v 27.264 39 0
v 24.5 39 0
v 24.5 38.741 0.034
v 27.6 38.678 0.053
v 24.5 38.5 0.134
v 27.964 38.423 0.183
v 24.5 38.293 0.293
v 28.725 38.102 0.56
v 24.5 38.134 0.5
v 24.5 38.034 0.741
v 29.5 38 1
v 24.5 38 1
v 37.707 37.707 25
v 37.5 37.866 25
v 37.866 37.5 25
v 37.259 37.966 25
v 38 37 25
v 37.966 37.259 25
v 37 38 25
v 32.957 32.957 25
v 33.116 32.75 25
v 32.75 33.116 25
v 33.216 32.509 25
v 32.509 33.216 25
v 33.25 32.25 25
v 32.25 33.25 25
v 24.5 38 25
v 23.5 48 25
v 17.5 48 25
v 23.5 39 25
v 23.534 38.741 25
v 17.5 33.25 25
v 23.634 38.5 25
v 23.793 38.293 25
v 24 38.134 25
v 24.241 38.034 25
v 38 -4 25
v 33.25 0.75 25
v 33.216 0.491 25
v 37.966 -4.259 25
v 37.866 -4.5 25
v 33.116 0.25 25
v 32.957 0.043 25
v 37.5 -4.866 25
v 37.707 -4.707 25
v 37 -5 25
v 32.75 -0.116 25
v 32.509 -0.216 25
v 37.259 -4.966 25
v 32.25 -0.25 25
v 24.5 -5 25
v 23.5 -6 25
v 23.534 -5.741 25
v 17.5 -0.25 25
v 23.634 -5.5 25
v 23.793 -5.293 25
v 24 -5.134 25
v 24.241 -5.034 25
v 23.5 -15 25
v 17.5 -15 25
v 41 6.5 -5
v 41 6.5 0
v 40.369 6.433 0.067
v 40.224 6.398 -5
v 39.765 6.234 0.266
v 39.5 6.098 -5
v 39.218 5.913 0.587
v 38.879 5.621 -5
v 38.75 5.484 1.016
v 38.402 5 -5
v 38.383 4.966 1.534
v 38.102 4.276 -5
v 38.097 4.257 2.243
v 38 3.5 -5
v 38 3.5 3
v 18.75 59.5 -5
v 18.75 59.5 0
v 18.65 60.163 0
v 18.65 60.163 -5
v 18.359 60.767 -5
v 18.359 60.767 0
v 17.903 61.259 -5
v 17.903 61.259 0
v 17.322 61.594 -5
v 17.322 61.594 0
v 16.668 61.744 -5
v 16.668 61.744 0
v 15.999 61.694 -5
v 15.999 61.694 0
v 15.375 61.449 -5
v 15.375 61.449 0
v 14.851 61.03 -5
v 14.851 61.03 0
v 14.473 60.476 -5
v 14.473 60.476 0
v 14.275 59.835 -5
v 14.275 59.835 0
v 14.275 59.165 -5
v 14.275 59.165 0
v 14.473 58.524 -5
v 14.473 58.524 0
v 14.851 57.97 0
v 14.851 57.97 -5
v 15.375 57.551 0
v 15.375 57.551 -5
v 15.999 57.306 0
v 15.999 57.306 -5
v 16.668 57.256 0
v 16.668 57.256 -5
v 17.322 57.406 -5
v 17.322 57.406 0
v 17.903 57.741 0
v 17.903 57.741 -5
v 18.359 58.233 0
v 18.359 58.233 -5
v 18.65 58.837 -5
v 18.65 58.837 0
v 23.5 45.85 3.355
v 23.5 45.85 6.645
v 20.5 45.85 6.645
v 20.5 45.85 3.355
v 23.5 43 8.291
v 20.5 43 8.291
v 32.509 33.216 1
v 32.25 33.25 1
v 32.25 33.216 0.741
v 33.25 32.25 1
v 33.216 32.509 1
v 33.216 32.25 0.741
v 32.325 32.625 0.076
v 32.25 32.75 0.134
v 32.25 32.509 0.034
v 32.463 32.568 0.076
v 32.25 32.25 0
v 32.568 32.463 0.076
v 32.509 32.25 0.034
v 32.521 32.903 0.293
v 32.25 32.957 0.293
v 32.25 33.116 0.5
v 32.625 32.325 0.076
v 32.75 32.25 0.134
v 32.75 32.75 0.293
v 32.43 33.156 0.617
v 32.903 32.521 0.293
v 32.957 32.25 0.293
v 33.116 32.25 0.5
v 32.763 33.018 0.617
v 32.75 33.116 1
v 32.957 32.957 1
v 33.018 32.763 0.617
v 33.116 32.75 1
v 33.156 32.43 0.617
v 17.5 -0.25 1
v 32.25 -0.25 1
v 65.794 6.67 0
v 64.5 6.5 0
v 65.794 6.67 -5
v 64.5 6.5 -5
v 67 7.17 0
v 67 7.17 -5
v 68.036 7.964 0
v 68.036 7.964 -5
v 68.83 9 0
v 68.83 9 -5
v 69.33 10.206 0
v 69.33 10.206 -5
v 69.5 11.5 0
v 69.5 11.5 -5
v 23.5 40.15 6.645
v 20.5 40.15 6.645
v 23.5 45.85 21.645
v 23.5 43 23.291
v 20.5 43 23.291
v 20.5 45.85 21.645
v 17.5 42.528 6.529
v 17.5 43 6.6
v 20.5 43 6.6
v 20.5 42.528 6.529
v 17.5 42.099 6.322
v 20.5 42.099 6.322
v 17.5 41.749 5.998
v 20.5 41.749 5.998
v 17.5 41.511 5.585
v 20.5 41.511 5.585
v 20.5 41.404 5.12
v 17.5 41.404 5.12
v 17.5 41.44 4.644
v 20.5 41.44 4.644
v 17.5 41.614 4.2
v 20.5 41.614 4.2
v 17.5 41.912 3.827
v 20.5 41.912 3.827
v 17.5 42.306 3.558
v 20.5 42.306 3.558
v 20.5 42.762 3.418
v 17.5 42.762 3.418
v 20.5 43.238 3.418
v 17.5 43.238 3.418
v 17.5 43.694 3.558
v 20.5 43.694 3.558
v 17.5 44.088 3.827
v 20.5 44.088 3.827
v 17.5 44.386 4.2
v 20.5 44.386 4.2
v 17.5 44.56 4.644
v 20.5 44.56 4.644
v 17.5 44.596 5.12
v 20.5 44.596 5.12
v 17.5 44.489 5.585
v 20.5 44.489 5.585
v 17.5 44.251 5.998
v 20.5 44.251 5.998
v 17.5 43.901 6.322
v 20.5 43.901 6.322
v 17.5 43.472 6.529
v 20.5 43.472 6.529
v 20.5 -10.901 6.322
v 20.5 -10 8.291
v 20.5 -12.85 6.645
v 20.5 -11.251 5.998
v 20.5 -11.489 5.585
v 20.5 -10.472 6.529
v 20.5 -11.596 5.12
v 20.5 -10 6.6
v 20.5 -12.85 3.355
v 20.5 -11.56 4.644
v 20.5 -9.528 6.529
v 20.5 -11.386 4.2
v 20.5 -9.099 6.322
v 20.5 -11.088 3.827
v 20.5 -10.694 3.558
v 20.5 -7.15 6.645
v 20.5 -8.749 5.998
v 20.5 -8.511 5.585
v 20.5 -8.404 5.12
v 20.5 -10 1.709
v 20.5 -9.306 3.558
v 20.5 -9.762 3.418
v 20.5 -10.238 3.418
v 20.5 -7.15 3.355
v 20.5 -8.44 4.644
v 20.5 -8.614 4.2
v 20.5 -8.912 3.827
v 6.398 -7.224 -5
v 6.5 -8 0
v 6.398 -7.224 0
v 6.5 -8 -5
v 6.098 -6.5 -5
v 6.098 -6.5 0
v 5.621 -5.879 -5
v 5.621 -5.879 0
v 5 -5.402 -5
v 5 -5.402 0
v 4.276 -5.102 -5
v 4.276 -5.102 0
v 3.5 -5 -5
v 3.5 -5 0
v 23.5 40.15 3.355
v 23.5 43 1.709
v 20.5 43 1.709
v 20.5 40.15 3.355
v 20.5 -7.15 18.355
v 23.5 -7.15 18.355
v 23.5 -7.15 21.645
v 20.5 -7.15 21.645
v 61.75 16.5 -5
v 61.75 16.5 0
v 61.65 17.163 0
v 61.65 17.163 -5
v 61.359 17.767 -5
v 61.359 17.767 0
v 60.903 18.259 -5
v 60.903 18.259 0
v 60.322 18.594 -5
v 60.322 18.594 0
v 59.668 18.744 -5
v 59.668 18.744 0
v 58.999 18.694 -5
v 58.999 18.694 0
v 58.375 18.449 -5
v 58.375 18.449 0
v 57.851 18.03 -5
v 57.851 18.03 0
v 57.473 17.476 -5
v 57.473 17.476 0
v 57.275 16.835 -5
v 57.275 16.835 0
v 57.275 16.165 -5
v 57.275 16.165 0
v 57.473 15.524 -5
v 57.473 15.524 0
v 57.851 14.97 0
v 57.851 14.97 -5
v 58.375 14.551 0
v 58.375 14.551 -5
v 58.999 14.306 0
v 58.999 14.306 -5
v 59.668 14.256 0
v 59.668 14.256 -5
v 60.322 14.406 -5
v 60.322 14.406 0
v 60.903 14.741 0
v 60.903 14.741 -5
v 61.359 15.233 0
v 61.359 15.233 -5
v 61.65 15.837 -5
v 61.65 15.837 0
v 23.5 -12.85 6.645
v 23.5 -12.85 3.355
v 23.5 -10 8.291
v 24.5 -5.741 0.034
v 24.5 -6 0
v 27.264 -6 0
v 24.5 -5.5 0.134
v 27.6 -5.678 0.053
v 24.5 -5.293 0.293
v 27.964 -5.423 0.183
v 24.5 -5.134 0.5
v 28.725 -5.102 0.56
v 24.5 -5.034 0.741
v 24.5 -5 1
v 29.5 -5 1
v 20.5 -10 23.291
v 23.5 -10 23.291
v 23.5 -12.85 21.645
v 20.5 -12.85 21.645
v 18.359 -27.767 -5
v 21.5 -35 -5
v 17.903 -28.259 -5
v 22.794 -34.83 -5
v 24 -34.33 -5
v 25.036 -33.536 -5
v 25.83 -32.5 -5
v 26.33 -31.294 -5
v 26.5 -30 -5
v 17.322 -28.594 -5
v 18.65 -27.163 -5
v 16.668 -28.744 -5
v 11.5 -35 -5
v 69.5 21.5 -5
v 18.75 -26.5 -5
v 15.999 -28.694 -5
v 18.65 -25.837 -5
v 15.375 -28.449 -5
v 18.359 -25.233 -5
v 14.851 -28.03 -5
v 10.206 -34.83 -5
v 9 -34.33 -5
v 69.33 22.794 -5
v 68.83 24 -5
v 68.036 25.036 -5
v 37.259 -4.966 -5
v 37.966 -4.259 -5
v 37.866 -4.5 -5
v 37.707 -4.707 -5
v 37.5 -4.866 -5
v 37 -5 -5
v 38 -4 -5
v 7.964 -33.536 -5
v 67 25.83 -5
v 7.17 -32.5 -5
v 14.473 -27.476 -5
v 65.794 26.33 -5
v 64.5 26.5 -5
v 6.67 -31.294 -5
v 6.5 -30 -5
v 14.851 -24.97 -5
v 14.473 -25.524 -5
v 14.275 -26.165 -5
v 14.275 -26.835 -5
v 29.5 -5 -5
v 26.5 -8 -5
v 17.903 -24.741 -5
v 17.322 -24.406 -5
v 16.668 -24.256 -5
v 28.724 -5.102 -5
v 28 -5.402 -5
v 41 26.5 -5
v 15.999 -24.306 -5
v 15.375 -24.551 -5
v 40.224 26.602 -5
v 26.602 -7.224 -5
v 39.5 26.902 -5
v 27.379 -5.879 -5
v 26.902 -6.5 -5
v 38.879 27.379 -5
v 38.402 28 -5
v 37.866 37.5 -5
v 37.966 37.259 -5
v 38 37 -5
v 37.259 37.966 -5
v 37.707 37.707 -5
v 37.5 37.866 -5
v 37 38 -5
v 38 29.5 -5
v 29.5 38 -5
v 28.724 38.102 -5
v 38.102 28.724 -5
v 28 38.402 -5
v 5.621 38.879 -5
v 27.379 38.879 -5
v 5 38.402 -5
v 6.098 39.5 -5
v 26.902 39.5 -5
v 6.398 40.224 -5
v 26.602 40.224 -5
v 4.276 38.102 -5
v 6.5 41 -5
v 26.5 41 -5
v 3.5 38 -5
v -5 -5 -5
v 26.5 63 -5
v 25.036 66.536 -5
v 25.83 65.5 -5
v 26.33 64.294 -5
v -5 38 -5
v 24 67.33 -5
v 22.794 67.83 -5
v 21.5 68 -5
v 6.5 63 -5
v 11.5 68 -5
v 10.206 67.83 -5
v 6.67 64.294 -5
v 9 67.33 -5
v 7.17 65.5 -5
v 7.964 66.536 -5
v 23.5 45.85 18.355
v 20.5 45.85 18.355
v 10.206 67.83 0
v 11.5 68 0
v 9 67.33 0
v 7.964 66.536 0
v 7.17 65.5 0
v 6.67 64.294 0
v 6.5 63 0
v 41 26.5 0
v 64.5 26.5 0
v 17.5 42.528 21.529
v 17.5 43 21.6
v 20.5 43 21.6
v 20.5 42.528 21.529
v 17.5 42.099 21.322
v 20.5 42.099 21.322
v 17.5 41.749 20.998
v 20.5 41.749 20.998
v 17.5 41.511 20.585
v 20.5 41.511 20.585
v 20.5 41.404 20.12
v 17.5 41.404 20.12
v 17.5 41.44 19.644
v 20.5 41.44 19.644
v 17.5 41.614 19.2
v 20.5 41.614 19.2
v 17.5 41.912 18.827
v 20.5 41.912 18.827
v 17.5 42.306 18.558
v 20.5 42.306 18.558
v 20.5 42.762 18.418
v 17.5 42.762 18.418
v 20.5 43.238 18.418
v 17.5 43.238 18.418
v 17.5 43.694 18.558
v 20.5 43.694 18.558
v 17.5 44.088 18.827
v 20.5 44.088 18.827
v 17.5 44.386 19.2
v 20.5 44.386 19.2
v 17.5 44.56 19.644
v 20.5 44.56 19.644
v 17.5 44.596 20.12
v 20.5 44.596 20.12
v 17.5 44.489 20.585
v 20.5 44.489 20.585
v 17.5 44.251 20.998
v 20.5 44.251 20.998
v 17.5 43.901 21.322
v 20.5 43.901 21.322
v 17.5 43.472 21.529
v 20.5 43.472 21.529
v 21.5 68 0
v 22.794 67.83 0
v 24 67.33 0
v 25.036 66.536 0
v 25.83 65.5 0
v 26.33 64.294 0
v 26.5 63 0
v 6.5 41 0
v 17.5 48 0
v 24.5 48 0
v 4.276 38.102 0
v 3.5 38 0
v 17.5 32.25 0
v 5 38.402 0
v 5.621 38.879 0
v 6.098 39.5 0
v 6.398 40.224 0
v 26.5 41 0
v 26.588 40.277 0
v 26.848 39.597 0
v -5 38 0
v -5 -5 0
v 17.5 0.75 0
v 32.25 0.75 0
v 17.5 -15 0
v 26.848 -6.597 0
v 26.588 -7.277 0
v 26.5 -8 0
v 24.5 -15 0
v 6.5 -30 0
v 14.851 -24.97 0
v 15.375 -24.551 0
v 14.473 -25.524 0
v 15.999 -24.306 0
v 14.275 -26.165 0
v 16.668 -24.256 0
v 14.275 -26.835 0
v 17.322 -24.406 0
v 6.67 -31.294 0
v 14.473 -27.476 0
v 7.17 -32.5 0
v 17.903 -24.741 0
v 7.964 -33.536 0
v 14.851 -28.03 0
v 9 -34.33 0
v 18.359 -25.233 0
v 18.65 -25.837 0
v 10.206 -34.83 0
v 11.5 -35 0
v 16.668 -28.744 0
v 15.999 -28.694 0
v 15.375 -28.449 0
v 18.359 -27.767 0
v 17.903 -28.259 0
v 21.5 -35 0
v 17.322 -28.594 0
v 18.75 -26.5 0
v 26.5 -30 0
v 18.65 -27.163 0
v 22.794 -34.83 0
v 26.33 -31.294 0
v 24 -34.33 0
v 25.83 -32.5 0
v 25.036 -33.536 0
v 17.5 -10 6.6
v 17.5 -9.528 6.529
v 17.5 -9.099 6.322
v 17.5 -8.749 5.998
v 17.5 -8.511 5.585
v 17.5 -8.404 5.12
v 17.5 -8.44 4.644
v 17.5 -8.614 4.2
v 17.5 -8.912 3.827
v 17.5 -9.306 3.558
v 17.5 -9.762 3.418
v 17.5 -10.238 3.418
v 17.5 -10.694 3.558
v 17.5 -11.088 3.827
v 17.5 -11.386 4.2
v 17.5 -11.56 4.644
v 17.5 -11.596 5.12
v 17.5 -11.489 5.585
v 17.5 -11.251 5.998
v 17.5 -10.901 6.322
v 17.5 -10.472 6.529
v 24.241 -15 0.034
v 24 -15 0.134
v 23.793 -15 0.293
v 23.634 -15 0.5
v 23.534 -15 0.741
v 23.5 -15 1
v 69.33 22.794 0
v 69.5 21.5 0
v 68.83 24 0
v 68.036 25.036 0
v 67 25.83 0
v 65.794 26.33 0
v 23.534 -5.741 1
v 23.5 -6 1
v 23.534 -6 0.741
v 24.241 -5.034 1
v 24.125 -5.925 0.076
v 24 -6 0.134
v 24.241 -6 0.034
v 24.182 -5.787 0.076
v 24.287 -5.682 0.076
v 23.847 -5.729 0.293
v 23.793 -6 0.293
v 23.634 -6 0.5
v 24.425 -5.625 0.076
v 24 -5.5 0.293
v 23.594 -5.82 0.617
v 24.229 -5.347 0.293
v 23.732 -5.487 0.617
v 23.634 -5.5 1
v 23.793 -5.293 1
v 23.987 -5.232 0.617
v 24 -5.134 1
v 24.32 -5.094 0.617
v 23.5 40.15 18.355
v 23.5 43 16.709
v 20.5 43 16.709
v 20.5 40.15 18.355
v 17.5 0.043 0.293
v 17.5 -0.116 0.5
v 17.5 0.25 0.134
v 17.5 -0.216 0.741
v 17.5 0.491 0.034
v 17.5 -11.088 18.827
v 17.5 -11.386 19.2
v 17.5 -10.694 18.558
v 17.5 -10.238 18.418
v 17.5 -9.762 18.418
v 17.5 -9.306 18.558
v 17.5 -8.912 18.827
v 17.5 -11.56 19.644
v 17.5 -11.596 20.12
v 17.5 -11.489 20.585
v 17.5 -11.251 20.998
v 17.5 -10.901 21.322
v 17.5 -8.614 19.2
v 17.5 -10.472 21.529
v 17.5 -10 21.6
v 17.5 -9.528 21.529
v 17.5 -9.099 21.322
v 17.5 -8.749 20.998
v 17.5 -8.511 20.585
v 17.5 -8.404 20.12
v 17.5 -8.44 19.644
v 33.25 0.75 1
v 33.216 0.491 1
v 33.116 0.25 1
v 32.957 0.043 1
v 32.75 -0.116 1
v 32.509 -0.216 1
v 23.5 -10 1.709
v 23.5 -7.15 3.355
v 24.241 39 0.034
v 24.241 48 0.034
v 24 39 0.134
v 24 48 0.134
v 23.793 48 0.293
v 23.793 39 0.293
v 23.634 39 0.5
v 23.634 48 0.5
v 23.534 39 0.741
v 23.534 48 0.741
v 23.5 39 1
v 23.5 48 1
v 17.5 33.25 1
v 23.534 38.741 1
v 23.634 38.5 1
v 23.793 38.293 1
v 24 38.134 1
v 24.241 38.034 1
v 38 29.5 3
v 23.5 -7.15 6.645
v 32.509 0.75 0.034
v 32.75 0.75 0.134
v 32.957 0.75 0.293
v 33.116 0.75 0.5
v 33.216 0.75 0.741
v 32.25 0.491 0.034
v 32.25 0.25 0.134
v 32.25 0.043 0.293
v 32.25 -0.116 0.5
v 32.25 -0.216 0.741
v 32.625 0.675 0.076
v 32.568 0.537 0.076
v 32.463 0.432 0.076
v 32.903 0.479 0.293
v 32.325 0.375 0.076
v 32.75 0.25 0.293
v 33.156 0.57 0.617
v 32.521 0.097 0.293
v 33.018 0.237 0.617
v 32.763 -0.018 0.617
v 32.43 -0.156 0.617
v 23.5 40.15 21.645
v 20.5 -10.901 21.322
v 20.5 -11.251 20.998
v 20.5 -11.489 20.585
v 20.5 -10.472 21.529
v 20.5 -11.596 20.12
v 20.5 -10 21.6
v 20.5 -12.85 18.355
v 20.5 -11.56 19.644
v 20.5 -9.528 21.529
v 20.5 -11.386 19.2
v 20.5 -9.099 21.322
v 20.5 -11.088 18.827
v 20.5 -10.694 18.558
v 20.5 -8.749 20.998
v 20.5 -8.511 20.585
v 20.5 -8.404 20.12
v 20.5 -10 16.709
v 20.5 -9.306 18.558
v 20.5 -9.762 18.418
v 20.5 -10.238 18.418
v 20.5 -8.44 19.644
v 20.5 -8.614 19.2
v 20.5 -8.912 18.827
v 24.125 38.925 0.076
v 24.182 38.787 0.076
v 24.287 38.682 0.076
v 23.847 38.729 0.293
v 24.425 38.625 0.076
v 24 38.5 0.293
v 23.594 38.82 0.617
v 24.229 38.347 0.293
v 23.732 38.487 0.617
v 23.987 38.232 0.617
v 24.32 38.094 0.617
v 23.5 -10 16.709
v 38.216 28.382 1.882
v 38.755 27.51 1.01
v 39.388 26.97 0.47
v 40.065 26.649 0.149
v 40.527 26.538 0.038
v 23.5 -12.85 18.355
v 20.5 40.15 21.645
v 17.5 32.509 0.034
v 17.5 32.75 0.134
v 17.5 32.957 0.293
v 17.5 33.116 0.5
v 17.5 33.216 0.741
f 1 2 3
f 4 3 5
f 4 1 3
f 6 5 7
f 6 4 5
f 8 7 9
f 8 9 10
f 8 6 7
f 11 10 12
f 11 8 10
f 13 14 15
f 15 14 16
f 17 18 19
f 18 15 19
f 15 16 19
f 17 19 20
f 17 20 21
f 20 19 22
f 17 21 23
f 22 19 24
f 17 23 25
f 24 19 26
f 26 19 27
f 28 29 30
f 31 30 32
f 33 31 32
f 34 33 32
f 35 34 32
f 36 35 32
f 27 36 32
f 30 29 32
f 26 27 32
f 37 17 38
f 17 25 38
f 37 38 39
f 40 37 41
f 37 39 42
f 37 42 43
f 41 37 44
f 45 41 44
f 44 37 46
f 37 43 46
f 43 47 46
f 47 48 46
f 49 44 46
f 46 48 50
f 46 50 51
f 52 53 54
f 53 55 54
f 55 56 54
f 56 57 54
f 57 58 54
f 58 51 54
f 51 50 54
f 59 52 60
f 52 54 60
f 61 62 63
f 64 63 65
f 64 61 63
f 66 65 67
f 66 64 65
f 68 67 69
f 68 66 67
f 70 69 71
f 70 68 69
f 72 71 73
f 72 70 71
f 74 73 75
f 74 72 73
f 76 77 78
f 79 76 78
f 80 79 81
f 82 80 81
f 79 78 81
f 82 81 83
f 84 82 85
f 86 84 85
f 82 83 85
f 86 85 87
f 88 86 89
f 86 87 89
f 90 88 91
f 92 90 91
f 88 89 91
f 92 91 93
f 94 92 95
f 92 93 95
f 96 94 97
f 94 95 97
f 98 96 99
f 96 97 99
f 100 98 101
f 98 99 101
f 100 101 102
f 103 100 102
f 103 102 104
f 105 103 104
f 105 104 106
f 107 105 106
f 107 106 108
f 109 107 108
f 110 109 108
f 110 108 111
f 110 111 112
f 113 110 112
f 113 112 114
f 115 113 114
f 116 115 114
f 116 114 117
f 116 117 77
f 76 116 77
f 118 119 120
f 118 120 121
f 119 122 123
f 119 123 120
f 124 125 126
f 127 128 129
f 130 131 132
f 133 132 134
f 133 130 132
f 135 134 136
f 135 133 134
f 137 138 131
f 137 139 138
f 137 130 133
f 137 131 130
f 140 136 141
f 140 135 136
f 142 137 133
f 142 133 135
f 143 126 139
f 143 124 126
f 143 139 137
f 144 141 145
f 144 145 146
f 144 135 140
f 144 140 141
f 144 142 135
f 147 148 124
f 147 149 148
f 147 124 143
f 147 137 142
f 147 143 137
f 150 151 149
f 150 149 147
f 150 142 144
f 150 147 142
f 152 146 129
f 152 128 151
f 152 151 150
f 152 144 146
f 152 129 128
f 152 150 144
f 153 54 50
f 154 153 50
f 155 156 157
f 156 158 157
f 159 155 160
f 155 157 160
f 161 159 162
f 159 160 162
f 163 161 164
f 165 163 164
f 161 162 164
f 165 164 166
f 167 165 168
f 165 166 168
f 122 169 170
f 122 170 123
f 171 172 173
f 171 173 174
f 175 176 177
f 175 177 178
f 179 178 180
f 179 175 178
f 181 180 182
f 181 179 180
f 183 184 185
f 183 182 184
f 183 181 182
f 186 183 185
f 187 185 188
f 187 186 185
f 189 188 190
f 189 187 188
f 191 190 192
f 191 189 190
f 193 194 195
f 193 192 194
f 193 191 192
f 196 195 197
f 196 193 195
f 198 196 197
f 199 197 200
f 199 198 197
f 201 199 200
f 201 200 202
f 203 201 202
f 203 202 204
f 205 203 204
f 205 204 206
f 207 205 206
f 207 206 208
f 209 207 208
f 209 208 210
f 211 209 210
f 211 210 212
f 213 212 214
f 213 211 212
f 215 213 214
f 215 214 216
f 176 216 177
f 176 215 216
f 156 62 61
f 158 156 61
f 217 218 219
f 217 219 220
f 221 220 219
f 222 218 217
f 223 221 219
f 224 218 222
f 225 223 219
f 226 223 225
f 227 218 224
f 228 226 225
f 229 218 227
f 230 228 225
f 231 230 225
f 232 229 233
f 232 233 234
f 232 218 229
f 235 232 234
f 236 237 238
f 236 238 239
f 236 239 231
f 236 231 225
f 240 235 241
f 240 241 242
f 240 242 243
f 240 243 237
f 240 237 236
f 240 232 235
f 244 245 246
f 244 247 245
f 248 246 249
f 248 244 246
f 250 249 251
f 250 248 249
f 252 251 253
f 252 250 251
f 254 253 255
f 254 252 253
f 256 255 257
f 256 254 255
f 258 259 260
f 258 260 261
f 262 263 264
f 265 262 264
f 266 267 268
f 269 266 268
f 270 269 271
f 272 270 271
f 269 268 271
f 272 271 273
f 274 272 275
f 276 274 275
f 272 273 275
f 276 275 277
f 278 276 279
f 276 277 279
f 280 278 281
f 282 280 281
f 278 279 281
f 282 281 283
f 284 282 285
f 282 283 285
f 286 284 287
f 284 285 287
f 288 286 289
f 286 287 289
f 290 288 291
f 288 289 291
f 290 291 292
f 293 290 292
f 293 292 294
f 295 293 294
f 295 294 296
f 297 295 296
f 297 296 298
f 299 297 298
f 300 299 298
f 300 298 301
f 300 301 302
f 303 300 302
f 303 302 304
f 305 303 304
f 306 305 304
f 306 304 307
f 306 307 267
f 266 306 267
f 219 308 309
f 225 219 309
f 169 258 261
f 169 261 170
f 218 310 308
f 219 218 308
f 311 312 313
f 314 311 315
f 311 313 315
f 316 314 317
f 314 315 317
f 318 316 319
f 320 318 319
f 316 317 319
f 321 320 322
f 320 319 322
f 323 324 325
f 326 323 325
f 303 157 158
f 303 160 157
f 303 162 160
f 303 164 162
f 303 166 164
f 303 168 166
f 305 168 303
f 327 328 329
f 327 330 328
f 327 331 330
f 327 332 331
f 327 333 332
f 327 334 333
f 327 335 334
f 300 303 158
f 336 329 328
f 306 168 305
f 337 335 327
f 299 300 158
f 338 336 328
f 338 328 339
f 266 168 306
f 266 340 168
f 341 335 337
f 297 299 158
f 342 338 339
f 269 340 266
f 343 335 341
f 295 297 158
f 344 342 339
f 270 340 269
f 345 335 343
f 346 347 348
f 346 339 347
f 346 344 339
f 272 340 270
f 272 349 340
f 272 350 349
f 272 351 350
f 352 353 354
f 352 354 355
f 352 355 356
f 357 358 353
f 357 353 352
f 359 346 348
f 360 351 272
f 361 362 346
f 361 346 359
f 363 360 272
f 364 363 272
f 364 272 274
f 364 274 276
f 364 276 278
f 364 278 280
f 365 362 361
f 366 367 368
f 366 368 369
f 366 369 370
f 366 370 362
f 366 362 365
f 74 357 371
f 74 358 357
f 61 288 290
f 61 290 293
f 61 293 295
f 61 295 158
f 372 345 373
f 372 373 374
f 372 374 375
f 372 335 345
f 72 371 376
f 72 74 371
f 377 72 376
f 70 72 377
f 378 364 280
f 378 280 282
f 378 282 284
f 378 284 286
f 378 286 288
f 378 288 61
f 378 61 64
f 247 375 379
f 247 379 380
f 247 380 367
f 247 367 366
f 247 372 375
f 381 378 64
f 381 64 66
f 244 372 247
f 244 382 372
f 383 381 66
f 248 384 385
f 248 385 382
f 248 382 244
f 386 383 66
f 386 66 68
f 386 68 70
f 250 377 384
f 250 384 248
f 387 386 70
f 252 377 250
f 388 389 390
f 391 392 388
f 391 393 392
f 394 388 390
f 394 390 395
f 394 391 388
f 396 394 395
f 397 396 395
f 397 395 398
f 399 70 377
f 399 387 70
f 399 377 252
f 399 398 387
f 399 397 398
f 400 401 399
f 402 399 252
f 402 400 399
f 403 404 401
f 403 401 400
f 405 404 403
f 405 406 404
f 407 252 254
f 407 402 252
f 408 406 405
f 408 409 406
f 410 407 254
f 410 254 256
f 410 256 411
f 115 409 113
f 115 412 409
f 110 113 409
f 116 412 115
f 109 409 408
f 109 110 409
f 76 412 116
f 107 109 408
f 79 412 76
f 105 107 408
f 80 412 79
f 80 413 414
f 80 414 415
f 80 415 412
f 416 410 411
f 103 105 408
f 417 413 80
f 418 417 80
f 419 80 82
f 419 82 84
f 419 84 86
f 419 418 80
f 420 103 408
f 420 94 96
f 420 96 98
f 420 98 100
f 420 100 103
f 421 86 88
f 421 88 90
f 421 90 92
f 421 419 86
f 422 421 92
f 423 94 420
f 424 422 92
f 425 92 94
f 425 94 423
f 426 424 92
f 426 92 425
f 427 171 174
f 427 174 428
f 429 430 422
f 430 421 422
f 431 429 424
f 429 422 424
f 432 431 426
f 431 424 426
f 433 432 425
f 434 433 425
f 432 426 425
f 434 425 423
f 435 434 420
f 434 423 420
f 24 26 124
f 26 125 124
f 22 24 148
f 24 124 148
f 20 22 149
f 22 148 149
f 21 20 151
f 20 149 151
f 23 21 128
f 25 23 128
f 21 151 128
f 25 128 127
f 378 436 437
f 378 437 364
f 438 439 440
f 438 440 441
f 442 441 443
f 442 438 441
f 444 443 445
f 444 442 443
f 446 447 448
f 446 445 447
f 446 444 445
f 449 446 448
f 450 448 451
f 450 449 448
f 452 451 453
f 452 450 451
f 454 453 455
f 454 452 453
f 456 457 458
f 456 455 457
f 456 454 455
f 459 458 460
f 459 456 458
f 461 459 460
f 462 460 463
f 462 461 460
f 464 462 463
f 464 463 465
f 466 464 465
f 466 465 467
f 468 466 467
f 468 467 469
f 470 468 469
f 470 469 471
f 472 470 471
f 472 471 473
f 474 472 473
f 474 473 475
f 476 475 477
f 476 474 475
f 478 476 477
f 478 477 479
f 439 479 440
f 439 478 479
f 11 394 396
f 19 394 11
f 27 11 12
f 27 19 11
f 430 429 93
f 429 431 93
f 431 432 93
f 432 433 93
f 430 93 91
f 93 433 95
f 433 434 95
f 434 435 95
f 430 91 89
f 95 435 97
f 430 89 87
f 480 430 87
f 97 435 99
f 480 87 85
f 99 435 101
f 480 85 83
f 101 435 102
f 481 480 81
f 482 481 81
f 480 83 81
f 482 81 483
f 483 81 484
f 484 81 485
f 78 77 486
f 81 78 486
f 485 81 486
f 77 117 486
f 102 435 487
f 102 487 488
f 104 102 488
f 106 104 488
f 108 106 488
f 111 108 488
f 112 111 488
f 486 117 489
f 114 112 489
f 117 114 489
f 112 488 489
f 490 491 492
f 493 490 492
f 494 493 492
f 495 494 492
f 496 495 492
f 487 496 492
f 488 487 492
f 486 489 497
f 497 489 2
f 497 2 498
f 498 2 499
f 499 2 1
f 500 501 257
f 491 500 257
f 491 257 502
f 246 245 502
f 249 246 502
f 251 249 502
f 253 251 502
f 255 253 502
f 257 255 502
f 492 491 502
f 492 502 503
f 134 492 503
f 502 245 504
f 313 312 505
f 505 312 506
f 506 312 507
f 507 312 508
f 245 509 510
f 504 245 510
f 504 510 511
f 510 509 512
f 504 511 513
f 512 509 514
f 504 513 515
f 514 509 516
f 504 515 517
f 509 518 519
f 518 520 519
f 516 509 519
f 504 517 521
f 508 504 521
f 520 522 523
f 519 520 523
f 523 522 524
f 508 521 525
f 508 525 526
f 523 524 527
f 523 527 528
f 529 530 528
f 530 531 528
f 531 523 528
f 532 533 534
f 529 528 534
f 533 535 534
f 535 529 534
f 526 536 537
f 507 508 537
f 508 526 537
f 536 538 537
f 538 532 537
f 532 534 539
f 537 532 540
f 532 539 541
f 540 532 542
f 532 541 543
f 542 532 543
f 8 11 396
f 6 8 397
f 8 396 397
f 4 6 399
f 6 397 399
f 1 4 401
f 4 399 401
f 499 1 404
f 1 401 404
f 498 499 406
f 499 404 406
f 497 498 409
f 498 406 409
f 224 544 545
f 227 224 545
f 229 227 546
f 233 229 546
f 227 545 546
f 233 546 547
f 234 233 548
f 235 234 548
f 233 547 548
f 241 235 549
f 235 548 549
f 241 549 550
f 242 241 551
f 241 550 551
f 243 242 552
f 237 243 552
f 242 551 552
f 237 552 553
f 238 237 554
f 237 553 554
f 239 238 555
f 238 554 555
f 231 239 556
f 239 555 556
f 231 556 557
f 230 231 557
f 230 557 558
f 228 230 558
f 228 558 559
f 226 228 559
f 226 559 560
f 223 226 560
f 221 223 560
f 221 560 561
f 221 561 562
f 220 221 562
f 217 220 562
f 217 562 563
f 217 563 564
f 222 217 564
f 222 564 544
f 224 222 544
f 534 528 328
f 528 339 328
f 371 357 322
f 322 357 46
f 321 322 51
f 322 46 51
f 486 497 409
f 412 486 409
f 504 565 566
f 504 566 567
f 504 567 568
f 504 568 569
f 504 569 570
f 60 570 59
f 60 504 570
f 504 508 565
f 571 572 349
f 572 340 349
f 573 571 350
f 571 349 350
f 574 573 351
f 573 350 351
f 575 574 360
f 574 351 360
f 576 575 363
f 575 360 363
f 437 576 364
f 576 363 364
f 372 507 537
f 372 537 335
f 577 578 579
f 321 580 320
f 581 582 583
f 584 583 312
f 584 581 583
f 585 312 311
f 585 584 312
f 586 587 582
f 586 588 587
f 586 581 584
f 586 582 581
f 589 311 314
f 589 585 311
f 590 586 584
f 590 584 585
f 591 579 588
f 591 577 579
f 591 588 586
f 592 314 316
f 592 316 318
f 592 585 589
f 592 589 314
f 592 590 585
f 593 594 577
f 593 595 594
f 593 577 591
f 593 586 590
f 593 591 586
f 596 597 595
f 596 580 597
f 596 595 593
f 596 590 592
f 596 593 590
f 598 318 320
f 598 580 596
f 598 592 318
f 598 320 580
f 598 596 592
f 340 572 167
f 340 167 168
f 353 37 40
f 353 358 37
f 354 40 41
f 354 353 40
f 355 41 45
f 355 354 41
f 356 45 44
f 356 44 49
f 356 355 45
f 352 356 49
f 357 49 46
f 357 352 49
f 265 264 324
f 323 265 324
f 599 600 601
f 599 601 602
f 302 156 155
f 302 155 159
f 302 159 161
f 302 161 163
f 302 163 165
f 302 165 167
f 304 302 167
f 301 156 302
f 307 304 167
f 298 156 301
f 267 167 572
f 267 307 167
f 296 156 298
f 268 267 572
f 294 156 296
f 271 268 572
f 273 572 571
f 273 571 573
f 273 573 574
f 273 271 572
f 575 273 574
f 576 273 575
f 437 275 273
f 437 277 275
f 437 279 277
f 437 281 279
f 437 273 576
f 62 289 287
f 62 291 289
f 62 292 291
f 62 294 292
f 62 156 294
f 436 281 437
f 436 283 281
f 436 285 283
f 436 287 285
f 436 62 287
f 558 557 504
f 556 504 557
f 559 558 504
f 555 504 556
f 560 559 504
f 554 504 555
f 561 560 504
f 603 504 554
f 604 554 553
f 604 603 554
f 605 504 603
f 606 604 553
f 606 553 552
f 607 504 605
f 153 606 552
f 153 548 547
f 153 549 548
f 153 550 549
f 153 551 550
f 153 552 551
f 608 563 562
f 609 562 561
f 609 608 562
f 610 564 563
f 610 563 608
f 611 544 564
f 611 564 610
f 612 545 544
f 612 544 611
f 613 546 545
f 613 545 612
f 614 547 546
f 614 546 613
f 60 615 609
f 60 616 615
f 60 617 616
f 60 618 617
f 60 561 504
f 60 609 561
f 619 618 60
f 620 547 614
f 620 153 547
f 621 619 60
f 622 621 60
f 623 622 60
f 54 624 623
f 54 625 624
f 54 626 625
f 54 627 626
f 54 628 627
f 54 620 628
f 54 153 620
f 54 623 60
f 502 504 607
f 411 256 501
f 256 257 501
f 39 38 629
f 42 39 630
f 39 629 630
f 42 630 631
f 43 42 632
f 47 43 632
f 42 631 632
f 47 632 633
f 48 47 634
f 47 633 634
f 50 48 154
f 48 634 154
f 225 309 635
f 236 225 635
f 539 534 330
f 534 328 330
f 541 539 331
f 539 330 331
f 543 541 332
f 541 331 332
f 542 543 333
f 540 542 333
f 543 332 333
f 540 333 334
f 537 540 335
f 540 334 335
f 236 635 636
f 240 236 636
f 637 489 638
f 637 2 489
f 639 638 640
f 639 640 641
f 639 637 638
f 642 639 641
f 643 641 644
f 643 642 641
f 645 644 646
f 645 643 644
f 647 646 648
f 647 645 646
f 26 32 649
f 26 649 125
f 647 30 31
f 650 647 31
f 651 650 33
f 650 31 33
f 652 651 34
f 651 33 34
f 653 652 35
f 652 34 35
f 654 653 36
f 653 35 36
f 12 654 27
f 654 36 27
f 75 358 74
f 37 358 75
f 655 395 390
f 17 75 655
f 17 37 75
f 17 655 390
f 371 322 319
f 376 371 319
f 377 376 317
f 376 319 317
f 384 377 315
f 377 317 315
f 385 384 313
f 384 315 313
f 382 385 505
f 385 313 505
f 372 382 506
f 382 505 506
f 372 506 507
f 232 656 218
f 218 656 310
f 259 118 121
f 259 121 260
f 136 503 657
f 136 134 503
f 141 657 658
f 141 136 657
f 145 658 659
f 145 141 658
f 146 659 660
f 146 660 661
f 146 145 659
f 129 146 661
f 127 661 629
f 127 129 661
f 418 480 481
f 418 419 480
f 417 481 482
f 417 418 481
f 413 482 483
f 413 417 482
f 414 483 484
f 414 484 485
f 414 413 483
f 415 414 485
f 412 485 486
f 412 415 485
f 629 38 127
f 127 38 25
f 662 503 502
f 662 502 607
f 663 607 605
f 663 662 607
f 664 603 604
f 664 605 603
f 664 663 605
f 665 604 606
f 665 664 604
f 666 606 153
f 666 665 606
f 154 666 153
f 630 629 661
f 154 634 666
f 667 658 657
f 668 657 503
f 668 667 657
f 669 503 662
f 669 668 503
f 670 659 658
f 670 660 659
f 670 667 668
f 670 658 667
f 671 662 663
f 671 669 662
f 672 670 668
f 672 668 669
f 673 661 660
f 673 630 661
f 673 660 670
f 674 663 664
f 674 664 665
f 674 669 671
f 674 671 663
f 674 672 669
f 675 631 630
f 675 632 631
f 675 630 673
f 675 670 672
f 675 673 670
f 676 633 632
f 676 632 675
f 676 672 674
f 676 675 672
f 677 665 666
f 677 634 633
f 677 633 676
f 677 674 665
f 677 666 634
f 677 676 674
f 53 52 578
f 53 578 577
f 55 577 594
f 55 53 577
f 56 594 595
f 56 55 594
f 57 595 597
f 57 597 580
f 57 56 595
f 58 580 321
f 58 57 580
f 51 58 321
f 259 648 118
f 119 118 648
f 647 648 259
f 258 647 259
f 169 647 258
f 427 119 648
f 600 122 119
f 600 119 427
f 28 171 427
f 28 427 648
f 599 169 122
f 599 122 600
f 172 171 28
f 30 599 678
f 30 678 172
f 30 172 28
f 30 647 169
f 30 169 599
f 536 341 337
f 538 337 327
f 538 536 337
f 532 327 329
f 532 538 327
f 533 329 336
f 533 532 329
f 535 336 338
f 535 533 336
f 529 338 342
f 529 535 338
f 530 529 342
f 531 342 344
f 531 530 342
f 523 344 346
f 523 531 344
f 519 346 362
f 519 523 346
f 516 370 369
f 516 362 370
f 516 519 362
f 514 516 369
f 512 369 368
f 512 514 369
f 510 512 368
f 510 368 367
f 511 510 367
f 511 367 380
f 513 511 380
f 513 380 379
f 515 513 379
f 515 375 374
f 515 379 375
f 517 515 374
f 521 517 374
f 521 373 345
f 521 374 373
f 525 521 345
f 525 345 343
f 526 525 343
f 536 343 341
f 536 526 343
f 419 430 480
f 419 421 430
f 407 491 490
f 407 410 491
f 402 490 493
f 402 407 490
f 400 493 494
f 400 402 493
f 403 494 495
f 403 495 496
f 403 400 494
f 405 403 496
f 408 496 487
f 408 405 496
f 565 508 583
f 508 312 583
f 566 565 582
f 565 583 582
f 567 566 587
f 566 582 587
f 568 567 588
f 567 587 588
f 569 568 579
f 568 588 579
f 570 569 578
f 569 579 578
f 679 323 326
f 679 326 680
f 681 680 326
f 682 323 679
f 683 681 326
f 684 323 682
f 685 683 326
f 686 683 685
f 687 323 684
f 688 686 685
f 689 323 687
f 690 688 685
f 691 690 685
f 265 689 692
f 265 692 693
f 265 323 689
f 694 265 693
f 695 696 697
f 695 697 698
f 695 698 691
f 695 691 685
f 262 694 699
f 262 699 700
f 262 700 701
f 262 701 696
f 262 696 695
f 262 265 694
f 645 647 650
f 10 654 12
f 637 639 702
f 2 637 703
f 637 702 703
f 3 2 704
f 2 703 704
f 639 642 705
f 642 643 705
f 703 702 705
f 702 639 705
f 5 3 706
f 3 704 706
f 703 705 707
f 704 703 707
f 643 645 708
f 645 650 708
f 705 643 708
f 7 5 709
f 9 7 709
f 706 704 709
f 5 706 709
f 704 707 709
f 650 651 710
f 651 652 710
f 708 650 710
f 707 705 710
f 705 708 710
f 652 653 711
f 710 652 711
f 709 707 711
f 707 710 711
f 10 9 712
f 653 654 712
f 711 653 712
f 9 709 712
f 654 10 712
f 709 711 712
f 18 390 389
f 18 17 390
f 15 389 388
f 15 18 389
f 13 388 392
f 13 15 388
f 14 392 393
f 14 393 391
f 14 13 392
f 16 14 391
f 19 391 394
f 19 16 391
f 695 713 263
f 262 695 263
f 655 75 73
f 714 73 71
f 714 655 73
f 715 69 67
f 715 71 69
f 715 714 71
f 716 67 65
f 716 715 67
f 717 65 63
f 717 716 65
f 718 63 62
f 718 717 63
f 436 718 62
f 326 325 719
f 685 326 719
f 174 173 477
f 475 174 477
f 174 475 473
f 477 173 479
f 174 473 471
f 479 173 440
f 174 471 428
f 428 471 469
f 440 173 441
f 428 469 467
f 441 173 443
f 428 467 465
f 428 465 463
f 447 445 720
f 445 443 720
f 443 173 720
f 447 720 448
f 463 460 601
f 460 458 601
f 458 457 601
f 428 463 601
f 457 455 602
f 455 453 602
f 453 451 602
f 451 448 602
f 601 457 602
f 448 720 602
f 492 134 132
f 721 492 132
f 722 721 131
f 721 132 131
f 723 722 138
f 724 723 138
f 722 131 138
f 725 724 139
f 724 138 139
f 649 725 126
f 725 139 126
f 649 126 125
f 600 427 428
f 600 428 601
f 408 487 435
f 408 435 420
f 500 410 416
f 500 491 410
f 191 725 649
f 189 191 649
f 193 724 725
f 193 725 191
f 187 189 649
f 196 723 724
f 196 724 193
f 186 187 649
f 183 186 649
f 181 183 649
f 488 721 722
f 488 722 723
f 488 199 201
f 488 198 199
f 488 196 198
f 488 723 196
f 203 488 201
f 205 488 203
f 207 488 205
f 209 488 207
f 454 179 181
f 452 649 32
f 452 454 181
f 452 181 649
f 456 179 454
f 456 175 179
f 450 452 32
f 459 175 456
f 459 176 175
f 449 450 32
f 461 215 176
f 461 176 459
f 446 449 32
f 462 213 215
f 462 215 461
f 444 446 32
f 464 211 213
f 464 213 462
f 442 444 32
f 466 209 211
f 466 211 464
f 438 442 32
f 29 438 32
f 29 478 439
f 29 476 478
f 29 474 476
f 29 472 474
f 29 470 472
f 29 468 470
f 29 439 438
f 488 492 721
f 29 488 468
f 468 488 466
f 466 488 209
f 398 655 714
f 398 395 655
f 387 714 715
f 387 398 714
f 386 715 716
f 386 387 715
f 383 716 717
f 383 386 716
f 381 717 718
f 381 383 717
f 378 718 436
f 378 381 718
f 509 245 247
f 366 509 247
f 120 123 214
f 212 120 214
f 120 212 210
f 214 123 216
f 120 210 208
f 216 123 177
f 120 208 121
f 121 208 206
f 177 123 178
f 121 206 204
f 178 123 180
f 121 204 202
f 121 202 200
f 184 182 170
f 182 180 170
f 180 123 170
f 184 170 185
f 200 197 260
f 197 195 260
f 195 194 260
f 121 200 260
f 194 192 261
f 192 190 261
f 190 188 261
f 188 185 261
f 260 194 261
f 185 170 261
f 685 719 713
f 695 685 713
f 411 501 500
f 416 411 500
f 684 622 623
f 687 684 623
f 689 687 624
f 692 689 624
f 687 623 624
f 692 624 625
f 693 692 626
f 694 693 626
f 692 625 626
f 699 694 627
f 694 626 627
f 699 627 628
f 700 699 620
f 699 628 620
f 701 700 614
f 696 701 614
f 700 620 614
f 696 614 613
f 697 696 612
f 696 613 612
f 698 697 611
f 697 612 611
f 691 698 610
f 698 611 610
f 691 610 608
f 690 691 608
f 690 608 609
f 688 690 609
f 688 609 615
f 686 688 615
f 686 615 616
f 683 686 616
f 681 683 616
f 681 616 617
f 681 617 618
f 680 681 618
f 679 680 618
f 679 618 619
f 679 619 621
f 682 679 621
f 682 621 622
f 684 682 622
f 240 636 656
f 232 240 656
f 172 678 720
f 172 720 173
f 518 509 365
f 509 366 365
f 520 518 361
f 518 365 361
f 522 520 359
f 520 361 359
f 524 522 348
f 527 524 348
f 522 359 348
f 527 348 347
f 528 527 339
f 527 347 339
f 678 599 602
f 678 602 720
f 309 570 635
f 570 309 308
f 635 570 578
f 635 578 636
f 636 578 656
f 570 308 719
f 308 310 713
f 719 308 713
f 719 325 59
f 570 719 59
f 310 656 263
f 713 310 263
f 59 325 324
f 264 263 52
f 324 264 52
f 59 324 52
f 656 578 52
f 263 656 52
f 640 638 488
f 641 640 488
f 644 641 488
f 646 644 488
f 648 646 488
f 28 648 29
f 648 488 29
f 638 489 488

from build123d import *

# Parameters (mm, degrees)
SKETCH1_W           = 43
SKETCH1_H           = 43
SKETCH1_W_2         = 33
SKETCH1_H_2         = 33
BOSS_EXTRUDE1_DEPTH = 25
SKETCH3_W           = 43
SKETCH3_H           = 43
BOSS_EXTRUDE2_DEPTH = 5
SKETCH4_W           = 20
SKETCH4_H           = 5
BOSS_EXTRUDE3_DEPTH = 30
SKETCH5_R           = 2.25
CUT_EXTRUDE1_DEPTH  = 6
SKETCH_1_W          = 21.5
SKETCH_1_H          = 43
CUT_EXTRUDE_1_DEPTH = 25
SKETCH_3_W          = 25
SKETCH_3_H          = 10
EXTRUDE_1_DEPTH     = 7
FILLET_1_R          = 1
SKETCH_4_R          = 1.6
CUT_EXTRUDE_2_DEPTH = 22.5
CUT_EXTRUDE_3_DEPTH = 3
SKETCH_6_W          = 16.75
SKETCH_6_H          = 33.5
CUT_EXTRUDE_4_DEPTH = 25
FILLET_2_R          = 1
FILLET_3_R          = 1
FILLET_4_R          = 5
FILLET_6_R          = 1
CUT_EXTRUDE_5_DEPTH = 1
SKETCH_9_W          = 5
SKETCH_9_H          = 20
EXTRUDE_2_DEPTH     = 31.5
SKETCH_10_R         = 2.25
CUT_EXTRUDE_6_DEPTH = 6
FILLET_7_R          = 5
FILLET_8_R          = 3
FILLET_9_R          = 1


with BuildPart() as part:
    # Sketch1 → Boss-Extrude1 (new body)
    with BuildSketch(Plane.XY):
        with Locations((16.5, 16.5)):
            Rectangle(SKETCH1_W, SKETCH1_H)
        with Locations((16.5, 16.5)):
            Rectangle(SKETCH1_W_2, SKETCH1_H_2, mode=Mode.SUBTRACT)
    extrude(amount=BOSS_EXTRUDE1_DEPTH)

    # Sketch3 → Boss-Extrude2 (add)
    with BuildSketch(Plane(origin=(0, 0, 0), x_dir=(-1, 0, 0), z_dir=(0, 0, -1))):
        with Locations((-16.5, 16.5)):
            Rectangle(SKETCH3_W, SKETCH3_H)
    extrude(amount=BOSS_EXTRUDE2_DEPTH)

    # Sketch4 → Boss-Extrude3 (add)
    with BuildSketch(Plane(origin=(0, 38, 0), x_dir=(1, 0, 0), z_dir=(0, 1, 0))):
        with Locations((16.5, 2.5)):
            Rectangle(SKETCH4_W, SKETCH4_H)
    boss_extrude3 = extrude(amount=BOSS_EXTRUDE3_DEPTH)

    # Sketch5 → Cut-Extrude1 (cut, through all)
    with BuildSketch(Plane.XY):
        with Locations((16.5, 59.5)):
            Circle(SKETCH5_R)
    cut_extrude1 = extrude(amount=-CUT_EXTRUDE1_DEPTH, mode=Mode.SUBTRACT)

    # Mirror1: Boss-Extrude3, Cut-Extrude1 across plane
    add(boss_extrude3.mirror(Plane(origin=(0, 16.5, 0), x_dir=(0, 0, 1), z_dir=(0, -1, 0))))
    add(cut_extrude1.mirror(Plane(origin=(0, 16.5, 0), x_dir=(0, 0, 1), z_dir=(0, -1, 0))), mode=Mode.SUBTRACT)

    # Эскиз1 → Вырез-Вытянуть1 (cut)
    with BuildSketch(Plane.XY.offset(25)):
        with Locations((5.75, 16.5)):
            Rectangle(SKETCH_1_W, SKETCH_1_H)
    extrude(amount=-CUT_EXTRUDE_1_DEPTH, mode=Mode.SUBTRACT)

    # Эскиз3 → Бобышка-Вытянуть1 (add)
    with BuildSketch(Plane.ZY.offset(-16.5)):
        with Locations((12.5, -10)):
            Rectangle(SKETCH_3_W, SKETCH_3_H)
    extrude_1 = extrude(amount=-EXTRUDE_1_DEPTH)

    # Скругление1
    fillet_1_edges = [part.edges().sort_by_distance(p)[0] for p in [
        (23.5, -5, 12.5),
    ]]
    fillet(fillet_1_edges, radius=FILLET_1_R)

    # Эскиз4 → Вырез-Вытянуть2 (cut, through all)
    with BuildSketch(Plane.ZY.offset(-16.5)):
        with Locations((20, -10)):
            Circle(SKETCH_4_R)
        with Locations((5, -10)):
            Circle(SKETCH_4_R)
    cut_extrude_2 = extrude(amount=-CUT_EXTRUDE_2_DEPTH, mode=Mode.SUBTRACT)

    # Эскиз5 → Вырез-Вытянуть3 (cut)
    with BuildSketch(Plane(origin=(23.5, 0, 0), x_dir=(0, 0, -1), z_dir=(1, 0, 0))):
        Polygon((-18.354551733, -12.85), (-16.709103466, -10), (-18.354551733, -7.15), (-21.645448267, -7.15), (-23.290896534, -10), (-21.645448267, -12.85), align=None)
        Polygon((-6.645448267, -12.85), (-3.354551733, -12.85), (-1.709103466, -10), (-3.354551733, -7.15), (-6.645448267, -7.15), (-8.290896534, -10), align=None)
    cut_extrude_3 = extrude(amount=-CUT_EXTRUDE_3_DEPTH, mode=Mode.SUBTRACT)

    # Зеркальное отражение2: Бобышка-Вытянуть1 across plane
    add(extrude_1.mirror(Plane(origin=(0, 16.5, 0), x_dir=(0, 0, 1), z_dir=(0, -1, 0))))

    # Зеркальное отражение3: Вырез-Вытянуть2 across plane
    add(cut_extrude_2.mirror(Plane(origin=(0, 16.5, 0), x_dir=(0, 0, 1), z_dir=(0, -1, 0))), mode=Mode.SUBTRACT)

    # Зеркальное отражение4: Вырез-Вытянуть3 across plane
    add(cut_extrude_3.mirror(Plane(origin=(0, 16.5, 0), x_dir=(0, 0, 1), z_dir=(0, -1, 0))), mode=Mode.SUBTRACT)

    # Эскиз6 → Вырез-Вытянуть4 (cut)
    with BuildSketch(Plane.XY.offset(25)):
        with Locations((24.875, 16.5)):
            Rectangle(SKETCH_6_W, SKETCH_6_H)
    extrude(amount=-CUT_EXTRUDE_4_DEPTH, mode=Mode.SUBTRACT)

    # Скругление2
    fillet_2_edges = [part.edges().sort_by_distance(p)[0] for p in [
        (23.5, 38, 12.5),
    ]]
    fillet(fillet_2_edges, radius=FILLET_2_R)

    # Скругление3
    fillet_3_edges = [part.edges().sort_by_distance(p)[0] for p in [
        (25.5, -5, 0),
        (23.5, -10.5, 0),
        (23.792893219, -5.292893219, 0),
        (23.5, 43.5, 0),
        (25.5, 38, 0),
        (23.792893219, 38.292893219, 0),
    ]]
    fillet(fillet_3_edges, radius=FILLET_3_R)

    # Скругление4
    fillet_4_edges = [part.edges().sort_by_distance(p)[0] for p in [
        (6.5, -35, -2.5),
        (26.5, -35, -2.5),
        (6.5, 68, -2.5),
        (26.5, 68, -2.5),
    ]]
    fillet(fillet_4_edges, radius=FILLET_4_R)

    # Скругление6
    fillet_6_edges = [part.edges().sort_by_distance(p)[0] for p in [
        (33.25, 33.25, 12.5),
        (33.25, -0.25, 12.5),
        (24.875, 33.25, 0),
        (33.25, 16.5, 0),
        (24.875, -0.25, 0),
    ]]
    fillet(fillet_6_edges, radius=FILLET_6_R)

    # Эскиз7 → Вырез-Вытянуть5 (cut)
    with BuildSketch(Plane.ZY.offset(-16.5)):
        with BuildLine():
            Line((0, 48), (0, 32.25))
            ThreePointArc((0, 32.25), (0.292893219, 32.957106781), (1, 33.25))
            Line((1, 33.25), (25, 33.25))
            Line((25, 33.25), (25, 48))
            Line((25, 48), (0, 48))
        make_face()
        with BuildLine():
            Line((25, -15), (25, -0.25))
            Line((25, -0.25), (1, -0.25))
            ThreePointArc((1, -0.25), (0.292893219, 0.042893219), (0, 0.75))
            Line((0, 0.75), (0, -15))
            Line((0, -15), (25, -15))
        make_face()
    extrude(amount=-CUT_EXTRUDE_5_DEPTH, mode=Mode.SUBTRACT)

    # Эскиз9 → Бобышка-Вытянуть2 (add)
    with BuildSketch(Plane(origin=(38, 0, 0), x_dir=(0, 0, -1), z_dir=(1, 0, 0))):
        with Locations((2.5, 16.5)):
            Rectangle(SKETCH_9_W, SKETCH_9_H)
    extrude(amount=EXTRUDE_2_DEPTH)

    # Эскиз10 → Вырез-Вытянуть6 (cut, through all)
    with BuildSketch(Plane.XY):
        with Locations((59.5, 16.5)):
            Circle(SKETCH_10_R)
    extrude(amount=-CUT_EXTRUDE_6_DEPTH, mode=Mode.SUBTRACT)

    # Скругление7
    fillet_7_edges = [part.edges().sort_by_distance(p)[0] for p in [
        (69.5, 6.5, -2.5),
        (69.5, 26.5, -2.5),
    ]]
    fillet(fillet_7_edges, radius=FILLET_7_R)

    # Скругление8
    fillet_8_edges = [part.edges().sort_by_distance(p)[0] for p in [
        (6.5, -5, -2.5),
        (6.5, 38, -2.5),
        (26.5, 38, -2),
        (26.5, -5, -2),
        (38, 6.5, -2.5),
        (38, 26.5, -2.5),
        (38, 16.5, 0),
    ]]
    fillet(fillet_8_edges, radius=FILLET_8_R)

    # Скругление9
    fillet_9_edges = [part.edges().sort_by_distance(p)[0] for p in [
        (38, -5, 10),
        (38, 38, 10),
    ]]
    fillet(fillet_9_edges, radius=FILLET_9_R)


solid = part.part
